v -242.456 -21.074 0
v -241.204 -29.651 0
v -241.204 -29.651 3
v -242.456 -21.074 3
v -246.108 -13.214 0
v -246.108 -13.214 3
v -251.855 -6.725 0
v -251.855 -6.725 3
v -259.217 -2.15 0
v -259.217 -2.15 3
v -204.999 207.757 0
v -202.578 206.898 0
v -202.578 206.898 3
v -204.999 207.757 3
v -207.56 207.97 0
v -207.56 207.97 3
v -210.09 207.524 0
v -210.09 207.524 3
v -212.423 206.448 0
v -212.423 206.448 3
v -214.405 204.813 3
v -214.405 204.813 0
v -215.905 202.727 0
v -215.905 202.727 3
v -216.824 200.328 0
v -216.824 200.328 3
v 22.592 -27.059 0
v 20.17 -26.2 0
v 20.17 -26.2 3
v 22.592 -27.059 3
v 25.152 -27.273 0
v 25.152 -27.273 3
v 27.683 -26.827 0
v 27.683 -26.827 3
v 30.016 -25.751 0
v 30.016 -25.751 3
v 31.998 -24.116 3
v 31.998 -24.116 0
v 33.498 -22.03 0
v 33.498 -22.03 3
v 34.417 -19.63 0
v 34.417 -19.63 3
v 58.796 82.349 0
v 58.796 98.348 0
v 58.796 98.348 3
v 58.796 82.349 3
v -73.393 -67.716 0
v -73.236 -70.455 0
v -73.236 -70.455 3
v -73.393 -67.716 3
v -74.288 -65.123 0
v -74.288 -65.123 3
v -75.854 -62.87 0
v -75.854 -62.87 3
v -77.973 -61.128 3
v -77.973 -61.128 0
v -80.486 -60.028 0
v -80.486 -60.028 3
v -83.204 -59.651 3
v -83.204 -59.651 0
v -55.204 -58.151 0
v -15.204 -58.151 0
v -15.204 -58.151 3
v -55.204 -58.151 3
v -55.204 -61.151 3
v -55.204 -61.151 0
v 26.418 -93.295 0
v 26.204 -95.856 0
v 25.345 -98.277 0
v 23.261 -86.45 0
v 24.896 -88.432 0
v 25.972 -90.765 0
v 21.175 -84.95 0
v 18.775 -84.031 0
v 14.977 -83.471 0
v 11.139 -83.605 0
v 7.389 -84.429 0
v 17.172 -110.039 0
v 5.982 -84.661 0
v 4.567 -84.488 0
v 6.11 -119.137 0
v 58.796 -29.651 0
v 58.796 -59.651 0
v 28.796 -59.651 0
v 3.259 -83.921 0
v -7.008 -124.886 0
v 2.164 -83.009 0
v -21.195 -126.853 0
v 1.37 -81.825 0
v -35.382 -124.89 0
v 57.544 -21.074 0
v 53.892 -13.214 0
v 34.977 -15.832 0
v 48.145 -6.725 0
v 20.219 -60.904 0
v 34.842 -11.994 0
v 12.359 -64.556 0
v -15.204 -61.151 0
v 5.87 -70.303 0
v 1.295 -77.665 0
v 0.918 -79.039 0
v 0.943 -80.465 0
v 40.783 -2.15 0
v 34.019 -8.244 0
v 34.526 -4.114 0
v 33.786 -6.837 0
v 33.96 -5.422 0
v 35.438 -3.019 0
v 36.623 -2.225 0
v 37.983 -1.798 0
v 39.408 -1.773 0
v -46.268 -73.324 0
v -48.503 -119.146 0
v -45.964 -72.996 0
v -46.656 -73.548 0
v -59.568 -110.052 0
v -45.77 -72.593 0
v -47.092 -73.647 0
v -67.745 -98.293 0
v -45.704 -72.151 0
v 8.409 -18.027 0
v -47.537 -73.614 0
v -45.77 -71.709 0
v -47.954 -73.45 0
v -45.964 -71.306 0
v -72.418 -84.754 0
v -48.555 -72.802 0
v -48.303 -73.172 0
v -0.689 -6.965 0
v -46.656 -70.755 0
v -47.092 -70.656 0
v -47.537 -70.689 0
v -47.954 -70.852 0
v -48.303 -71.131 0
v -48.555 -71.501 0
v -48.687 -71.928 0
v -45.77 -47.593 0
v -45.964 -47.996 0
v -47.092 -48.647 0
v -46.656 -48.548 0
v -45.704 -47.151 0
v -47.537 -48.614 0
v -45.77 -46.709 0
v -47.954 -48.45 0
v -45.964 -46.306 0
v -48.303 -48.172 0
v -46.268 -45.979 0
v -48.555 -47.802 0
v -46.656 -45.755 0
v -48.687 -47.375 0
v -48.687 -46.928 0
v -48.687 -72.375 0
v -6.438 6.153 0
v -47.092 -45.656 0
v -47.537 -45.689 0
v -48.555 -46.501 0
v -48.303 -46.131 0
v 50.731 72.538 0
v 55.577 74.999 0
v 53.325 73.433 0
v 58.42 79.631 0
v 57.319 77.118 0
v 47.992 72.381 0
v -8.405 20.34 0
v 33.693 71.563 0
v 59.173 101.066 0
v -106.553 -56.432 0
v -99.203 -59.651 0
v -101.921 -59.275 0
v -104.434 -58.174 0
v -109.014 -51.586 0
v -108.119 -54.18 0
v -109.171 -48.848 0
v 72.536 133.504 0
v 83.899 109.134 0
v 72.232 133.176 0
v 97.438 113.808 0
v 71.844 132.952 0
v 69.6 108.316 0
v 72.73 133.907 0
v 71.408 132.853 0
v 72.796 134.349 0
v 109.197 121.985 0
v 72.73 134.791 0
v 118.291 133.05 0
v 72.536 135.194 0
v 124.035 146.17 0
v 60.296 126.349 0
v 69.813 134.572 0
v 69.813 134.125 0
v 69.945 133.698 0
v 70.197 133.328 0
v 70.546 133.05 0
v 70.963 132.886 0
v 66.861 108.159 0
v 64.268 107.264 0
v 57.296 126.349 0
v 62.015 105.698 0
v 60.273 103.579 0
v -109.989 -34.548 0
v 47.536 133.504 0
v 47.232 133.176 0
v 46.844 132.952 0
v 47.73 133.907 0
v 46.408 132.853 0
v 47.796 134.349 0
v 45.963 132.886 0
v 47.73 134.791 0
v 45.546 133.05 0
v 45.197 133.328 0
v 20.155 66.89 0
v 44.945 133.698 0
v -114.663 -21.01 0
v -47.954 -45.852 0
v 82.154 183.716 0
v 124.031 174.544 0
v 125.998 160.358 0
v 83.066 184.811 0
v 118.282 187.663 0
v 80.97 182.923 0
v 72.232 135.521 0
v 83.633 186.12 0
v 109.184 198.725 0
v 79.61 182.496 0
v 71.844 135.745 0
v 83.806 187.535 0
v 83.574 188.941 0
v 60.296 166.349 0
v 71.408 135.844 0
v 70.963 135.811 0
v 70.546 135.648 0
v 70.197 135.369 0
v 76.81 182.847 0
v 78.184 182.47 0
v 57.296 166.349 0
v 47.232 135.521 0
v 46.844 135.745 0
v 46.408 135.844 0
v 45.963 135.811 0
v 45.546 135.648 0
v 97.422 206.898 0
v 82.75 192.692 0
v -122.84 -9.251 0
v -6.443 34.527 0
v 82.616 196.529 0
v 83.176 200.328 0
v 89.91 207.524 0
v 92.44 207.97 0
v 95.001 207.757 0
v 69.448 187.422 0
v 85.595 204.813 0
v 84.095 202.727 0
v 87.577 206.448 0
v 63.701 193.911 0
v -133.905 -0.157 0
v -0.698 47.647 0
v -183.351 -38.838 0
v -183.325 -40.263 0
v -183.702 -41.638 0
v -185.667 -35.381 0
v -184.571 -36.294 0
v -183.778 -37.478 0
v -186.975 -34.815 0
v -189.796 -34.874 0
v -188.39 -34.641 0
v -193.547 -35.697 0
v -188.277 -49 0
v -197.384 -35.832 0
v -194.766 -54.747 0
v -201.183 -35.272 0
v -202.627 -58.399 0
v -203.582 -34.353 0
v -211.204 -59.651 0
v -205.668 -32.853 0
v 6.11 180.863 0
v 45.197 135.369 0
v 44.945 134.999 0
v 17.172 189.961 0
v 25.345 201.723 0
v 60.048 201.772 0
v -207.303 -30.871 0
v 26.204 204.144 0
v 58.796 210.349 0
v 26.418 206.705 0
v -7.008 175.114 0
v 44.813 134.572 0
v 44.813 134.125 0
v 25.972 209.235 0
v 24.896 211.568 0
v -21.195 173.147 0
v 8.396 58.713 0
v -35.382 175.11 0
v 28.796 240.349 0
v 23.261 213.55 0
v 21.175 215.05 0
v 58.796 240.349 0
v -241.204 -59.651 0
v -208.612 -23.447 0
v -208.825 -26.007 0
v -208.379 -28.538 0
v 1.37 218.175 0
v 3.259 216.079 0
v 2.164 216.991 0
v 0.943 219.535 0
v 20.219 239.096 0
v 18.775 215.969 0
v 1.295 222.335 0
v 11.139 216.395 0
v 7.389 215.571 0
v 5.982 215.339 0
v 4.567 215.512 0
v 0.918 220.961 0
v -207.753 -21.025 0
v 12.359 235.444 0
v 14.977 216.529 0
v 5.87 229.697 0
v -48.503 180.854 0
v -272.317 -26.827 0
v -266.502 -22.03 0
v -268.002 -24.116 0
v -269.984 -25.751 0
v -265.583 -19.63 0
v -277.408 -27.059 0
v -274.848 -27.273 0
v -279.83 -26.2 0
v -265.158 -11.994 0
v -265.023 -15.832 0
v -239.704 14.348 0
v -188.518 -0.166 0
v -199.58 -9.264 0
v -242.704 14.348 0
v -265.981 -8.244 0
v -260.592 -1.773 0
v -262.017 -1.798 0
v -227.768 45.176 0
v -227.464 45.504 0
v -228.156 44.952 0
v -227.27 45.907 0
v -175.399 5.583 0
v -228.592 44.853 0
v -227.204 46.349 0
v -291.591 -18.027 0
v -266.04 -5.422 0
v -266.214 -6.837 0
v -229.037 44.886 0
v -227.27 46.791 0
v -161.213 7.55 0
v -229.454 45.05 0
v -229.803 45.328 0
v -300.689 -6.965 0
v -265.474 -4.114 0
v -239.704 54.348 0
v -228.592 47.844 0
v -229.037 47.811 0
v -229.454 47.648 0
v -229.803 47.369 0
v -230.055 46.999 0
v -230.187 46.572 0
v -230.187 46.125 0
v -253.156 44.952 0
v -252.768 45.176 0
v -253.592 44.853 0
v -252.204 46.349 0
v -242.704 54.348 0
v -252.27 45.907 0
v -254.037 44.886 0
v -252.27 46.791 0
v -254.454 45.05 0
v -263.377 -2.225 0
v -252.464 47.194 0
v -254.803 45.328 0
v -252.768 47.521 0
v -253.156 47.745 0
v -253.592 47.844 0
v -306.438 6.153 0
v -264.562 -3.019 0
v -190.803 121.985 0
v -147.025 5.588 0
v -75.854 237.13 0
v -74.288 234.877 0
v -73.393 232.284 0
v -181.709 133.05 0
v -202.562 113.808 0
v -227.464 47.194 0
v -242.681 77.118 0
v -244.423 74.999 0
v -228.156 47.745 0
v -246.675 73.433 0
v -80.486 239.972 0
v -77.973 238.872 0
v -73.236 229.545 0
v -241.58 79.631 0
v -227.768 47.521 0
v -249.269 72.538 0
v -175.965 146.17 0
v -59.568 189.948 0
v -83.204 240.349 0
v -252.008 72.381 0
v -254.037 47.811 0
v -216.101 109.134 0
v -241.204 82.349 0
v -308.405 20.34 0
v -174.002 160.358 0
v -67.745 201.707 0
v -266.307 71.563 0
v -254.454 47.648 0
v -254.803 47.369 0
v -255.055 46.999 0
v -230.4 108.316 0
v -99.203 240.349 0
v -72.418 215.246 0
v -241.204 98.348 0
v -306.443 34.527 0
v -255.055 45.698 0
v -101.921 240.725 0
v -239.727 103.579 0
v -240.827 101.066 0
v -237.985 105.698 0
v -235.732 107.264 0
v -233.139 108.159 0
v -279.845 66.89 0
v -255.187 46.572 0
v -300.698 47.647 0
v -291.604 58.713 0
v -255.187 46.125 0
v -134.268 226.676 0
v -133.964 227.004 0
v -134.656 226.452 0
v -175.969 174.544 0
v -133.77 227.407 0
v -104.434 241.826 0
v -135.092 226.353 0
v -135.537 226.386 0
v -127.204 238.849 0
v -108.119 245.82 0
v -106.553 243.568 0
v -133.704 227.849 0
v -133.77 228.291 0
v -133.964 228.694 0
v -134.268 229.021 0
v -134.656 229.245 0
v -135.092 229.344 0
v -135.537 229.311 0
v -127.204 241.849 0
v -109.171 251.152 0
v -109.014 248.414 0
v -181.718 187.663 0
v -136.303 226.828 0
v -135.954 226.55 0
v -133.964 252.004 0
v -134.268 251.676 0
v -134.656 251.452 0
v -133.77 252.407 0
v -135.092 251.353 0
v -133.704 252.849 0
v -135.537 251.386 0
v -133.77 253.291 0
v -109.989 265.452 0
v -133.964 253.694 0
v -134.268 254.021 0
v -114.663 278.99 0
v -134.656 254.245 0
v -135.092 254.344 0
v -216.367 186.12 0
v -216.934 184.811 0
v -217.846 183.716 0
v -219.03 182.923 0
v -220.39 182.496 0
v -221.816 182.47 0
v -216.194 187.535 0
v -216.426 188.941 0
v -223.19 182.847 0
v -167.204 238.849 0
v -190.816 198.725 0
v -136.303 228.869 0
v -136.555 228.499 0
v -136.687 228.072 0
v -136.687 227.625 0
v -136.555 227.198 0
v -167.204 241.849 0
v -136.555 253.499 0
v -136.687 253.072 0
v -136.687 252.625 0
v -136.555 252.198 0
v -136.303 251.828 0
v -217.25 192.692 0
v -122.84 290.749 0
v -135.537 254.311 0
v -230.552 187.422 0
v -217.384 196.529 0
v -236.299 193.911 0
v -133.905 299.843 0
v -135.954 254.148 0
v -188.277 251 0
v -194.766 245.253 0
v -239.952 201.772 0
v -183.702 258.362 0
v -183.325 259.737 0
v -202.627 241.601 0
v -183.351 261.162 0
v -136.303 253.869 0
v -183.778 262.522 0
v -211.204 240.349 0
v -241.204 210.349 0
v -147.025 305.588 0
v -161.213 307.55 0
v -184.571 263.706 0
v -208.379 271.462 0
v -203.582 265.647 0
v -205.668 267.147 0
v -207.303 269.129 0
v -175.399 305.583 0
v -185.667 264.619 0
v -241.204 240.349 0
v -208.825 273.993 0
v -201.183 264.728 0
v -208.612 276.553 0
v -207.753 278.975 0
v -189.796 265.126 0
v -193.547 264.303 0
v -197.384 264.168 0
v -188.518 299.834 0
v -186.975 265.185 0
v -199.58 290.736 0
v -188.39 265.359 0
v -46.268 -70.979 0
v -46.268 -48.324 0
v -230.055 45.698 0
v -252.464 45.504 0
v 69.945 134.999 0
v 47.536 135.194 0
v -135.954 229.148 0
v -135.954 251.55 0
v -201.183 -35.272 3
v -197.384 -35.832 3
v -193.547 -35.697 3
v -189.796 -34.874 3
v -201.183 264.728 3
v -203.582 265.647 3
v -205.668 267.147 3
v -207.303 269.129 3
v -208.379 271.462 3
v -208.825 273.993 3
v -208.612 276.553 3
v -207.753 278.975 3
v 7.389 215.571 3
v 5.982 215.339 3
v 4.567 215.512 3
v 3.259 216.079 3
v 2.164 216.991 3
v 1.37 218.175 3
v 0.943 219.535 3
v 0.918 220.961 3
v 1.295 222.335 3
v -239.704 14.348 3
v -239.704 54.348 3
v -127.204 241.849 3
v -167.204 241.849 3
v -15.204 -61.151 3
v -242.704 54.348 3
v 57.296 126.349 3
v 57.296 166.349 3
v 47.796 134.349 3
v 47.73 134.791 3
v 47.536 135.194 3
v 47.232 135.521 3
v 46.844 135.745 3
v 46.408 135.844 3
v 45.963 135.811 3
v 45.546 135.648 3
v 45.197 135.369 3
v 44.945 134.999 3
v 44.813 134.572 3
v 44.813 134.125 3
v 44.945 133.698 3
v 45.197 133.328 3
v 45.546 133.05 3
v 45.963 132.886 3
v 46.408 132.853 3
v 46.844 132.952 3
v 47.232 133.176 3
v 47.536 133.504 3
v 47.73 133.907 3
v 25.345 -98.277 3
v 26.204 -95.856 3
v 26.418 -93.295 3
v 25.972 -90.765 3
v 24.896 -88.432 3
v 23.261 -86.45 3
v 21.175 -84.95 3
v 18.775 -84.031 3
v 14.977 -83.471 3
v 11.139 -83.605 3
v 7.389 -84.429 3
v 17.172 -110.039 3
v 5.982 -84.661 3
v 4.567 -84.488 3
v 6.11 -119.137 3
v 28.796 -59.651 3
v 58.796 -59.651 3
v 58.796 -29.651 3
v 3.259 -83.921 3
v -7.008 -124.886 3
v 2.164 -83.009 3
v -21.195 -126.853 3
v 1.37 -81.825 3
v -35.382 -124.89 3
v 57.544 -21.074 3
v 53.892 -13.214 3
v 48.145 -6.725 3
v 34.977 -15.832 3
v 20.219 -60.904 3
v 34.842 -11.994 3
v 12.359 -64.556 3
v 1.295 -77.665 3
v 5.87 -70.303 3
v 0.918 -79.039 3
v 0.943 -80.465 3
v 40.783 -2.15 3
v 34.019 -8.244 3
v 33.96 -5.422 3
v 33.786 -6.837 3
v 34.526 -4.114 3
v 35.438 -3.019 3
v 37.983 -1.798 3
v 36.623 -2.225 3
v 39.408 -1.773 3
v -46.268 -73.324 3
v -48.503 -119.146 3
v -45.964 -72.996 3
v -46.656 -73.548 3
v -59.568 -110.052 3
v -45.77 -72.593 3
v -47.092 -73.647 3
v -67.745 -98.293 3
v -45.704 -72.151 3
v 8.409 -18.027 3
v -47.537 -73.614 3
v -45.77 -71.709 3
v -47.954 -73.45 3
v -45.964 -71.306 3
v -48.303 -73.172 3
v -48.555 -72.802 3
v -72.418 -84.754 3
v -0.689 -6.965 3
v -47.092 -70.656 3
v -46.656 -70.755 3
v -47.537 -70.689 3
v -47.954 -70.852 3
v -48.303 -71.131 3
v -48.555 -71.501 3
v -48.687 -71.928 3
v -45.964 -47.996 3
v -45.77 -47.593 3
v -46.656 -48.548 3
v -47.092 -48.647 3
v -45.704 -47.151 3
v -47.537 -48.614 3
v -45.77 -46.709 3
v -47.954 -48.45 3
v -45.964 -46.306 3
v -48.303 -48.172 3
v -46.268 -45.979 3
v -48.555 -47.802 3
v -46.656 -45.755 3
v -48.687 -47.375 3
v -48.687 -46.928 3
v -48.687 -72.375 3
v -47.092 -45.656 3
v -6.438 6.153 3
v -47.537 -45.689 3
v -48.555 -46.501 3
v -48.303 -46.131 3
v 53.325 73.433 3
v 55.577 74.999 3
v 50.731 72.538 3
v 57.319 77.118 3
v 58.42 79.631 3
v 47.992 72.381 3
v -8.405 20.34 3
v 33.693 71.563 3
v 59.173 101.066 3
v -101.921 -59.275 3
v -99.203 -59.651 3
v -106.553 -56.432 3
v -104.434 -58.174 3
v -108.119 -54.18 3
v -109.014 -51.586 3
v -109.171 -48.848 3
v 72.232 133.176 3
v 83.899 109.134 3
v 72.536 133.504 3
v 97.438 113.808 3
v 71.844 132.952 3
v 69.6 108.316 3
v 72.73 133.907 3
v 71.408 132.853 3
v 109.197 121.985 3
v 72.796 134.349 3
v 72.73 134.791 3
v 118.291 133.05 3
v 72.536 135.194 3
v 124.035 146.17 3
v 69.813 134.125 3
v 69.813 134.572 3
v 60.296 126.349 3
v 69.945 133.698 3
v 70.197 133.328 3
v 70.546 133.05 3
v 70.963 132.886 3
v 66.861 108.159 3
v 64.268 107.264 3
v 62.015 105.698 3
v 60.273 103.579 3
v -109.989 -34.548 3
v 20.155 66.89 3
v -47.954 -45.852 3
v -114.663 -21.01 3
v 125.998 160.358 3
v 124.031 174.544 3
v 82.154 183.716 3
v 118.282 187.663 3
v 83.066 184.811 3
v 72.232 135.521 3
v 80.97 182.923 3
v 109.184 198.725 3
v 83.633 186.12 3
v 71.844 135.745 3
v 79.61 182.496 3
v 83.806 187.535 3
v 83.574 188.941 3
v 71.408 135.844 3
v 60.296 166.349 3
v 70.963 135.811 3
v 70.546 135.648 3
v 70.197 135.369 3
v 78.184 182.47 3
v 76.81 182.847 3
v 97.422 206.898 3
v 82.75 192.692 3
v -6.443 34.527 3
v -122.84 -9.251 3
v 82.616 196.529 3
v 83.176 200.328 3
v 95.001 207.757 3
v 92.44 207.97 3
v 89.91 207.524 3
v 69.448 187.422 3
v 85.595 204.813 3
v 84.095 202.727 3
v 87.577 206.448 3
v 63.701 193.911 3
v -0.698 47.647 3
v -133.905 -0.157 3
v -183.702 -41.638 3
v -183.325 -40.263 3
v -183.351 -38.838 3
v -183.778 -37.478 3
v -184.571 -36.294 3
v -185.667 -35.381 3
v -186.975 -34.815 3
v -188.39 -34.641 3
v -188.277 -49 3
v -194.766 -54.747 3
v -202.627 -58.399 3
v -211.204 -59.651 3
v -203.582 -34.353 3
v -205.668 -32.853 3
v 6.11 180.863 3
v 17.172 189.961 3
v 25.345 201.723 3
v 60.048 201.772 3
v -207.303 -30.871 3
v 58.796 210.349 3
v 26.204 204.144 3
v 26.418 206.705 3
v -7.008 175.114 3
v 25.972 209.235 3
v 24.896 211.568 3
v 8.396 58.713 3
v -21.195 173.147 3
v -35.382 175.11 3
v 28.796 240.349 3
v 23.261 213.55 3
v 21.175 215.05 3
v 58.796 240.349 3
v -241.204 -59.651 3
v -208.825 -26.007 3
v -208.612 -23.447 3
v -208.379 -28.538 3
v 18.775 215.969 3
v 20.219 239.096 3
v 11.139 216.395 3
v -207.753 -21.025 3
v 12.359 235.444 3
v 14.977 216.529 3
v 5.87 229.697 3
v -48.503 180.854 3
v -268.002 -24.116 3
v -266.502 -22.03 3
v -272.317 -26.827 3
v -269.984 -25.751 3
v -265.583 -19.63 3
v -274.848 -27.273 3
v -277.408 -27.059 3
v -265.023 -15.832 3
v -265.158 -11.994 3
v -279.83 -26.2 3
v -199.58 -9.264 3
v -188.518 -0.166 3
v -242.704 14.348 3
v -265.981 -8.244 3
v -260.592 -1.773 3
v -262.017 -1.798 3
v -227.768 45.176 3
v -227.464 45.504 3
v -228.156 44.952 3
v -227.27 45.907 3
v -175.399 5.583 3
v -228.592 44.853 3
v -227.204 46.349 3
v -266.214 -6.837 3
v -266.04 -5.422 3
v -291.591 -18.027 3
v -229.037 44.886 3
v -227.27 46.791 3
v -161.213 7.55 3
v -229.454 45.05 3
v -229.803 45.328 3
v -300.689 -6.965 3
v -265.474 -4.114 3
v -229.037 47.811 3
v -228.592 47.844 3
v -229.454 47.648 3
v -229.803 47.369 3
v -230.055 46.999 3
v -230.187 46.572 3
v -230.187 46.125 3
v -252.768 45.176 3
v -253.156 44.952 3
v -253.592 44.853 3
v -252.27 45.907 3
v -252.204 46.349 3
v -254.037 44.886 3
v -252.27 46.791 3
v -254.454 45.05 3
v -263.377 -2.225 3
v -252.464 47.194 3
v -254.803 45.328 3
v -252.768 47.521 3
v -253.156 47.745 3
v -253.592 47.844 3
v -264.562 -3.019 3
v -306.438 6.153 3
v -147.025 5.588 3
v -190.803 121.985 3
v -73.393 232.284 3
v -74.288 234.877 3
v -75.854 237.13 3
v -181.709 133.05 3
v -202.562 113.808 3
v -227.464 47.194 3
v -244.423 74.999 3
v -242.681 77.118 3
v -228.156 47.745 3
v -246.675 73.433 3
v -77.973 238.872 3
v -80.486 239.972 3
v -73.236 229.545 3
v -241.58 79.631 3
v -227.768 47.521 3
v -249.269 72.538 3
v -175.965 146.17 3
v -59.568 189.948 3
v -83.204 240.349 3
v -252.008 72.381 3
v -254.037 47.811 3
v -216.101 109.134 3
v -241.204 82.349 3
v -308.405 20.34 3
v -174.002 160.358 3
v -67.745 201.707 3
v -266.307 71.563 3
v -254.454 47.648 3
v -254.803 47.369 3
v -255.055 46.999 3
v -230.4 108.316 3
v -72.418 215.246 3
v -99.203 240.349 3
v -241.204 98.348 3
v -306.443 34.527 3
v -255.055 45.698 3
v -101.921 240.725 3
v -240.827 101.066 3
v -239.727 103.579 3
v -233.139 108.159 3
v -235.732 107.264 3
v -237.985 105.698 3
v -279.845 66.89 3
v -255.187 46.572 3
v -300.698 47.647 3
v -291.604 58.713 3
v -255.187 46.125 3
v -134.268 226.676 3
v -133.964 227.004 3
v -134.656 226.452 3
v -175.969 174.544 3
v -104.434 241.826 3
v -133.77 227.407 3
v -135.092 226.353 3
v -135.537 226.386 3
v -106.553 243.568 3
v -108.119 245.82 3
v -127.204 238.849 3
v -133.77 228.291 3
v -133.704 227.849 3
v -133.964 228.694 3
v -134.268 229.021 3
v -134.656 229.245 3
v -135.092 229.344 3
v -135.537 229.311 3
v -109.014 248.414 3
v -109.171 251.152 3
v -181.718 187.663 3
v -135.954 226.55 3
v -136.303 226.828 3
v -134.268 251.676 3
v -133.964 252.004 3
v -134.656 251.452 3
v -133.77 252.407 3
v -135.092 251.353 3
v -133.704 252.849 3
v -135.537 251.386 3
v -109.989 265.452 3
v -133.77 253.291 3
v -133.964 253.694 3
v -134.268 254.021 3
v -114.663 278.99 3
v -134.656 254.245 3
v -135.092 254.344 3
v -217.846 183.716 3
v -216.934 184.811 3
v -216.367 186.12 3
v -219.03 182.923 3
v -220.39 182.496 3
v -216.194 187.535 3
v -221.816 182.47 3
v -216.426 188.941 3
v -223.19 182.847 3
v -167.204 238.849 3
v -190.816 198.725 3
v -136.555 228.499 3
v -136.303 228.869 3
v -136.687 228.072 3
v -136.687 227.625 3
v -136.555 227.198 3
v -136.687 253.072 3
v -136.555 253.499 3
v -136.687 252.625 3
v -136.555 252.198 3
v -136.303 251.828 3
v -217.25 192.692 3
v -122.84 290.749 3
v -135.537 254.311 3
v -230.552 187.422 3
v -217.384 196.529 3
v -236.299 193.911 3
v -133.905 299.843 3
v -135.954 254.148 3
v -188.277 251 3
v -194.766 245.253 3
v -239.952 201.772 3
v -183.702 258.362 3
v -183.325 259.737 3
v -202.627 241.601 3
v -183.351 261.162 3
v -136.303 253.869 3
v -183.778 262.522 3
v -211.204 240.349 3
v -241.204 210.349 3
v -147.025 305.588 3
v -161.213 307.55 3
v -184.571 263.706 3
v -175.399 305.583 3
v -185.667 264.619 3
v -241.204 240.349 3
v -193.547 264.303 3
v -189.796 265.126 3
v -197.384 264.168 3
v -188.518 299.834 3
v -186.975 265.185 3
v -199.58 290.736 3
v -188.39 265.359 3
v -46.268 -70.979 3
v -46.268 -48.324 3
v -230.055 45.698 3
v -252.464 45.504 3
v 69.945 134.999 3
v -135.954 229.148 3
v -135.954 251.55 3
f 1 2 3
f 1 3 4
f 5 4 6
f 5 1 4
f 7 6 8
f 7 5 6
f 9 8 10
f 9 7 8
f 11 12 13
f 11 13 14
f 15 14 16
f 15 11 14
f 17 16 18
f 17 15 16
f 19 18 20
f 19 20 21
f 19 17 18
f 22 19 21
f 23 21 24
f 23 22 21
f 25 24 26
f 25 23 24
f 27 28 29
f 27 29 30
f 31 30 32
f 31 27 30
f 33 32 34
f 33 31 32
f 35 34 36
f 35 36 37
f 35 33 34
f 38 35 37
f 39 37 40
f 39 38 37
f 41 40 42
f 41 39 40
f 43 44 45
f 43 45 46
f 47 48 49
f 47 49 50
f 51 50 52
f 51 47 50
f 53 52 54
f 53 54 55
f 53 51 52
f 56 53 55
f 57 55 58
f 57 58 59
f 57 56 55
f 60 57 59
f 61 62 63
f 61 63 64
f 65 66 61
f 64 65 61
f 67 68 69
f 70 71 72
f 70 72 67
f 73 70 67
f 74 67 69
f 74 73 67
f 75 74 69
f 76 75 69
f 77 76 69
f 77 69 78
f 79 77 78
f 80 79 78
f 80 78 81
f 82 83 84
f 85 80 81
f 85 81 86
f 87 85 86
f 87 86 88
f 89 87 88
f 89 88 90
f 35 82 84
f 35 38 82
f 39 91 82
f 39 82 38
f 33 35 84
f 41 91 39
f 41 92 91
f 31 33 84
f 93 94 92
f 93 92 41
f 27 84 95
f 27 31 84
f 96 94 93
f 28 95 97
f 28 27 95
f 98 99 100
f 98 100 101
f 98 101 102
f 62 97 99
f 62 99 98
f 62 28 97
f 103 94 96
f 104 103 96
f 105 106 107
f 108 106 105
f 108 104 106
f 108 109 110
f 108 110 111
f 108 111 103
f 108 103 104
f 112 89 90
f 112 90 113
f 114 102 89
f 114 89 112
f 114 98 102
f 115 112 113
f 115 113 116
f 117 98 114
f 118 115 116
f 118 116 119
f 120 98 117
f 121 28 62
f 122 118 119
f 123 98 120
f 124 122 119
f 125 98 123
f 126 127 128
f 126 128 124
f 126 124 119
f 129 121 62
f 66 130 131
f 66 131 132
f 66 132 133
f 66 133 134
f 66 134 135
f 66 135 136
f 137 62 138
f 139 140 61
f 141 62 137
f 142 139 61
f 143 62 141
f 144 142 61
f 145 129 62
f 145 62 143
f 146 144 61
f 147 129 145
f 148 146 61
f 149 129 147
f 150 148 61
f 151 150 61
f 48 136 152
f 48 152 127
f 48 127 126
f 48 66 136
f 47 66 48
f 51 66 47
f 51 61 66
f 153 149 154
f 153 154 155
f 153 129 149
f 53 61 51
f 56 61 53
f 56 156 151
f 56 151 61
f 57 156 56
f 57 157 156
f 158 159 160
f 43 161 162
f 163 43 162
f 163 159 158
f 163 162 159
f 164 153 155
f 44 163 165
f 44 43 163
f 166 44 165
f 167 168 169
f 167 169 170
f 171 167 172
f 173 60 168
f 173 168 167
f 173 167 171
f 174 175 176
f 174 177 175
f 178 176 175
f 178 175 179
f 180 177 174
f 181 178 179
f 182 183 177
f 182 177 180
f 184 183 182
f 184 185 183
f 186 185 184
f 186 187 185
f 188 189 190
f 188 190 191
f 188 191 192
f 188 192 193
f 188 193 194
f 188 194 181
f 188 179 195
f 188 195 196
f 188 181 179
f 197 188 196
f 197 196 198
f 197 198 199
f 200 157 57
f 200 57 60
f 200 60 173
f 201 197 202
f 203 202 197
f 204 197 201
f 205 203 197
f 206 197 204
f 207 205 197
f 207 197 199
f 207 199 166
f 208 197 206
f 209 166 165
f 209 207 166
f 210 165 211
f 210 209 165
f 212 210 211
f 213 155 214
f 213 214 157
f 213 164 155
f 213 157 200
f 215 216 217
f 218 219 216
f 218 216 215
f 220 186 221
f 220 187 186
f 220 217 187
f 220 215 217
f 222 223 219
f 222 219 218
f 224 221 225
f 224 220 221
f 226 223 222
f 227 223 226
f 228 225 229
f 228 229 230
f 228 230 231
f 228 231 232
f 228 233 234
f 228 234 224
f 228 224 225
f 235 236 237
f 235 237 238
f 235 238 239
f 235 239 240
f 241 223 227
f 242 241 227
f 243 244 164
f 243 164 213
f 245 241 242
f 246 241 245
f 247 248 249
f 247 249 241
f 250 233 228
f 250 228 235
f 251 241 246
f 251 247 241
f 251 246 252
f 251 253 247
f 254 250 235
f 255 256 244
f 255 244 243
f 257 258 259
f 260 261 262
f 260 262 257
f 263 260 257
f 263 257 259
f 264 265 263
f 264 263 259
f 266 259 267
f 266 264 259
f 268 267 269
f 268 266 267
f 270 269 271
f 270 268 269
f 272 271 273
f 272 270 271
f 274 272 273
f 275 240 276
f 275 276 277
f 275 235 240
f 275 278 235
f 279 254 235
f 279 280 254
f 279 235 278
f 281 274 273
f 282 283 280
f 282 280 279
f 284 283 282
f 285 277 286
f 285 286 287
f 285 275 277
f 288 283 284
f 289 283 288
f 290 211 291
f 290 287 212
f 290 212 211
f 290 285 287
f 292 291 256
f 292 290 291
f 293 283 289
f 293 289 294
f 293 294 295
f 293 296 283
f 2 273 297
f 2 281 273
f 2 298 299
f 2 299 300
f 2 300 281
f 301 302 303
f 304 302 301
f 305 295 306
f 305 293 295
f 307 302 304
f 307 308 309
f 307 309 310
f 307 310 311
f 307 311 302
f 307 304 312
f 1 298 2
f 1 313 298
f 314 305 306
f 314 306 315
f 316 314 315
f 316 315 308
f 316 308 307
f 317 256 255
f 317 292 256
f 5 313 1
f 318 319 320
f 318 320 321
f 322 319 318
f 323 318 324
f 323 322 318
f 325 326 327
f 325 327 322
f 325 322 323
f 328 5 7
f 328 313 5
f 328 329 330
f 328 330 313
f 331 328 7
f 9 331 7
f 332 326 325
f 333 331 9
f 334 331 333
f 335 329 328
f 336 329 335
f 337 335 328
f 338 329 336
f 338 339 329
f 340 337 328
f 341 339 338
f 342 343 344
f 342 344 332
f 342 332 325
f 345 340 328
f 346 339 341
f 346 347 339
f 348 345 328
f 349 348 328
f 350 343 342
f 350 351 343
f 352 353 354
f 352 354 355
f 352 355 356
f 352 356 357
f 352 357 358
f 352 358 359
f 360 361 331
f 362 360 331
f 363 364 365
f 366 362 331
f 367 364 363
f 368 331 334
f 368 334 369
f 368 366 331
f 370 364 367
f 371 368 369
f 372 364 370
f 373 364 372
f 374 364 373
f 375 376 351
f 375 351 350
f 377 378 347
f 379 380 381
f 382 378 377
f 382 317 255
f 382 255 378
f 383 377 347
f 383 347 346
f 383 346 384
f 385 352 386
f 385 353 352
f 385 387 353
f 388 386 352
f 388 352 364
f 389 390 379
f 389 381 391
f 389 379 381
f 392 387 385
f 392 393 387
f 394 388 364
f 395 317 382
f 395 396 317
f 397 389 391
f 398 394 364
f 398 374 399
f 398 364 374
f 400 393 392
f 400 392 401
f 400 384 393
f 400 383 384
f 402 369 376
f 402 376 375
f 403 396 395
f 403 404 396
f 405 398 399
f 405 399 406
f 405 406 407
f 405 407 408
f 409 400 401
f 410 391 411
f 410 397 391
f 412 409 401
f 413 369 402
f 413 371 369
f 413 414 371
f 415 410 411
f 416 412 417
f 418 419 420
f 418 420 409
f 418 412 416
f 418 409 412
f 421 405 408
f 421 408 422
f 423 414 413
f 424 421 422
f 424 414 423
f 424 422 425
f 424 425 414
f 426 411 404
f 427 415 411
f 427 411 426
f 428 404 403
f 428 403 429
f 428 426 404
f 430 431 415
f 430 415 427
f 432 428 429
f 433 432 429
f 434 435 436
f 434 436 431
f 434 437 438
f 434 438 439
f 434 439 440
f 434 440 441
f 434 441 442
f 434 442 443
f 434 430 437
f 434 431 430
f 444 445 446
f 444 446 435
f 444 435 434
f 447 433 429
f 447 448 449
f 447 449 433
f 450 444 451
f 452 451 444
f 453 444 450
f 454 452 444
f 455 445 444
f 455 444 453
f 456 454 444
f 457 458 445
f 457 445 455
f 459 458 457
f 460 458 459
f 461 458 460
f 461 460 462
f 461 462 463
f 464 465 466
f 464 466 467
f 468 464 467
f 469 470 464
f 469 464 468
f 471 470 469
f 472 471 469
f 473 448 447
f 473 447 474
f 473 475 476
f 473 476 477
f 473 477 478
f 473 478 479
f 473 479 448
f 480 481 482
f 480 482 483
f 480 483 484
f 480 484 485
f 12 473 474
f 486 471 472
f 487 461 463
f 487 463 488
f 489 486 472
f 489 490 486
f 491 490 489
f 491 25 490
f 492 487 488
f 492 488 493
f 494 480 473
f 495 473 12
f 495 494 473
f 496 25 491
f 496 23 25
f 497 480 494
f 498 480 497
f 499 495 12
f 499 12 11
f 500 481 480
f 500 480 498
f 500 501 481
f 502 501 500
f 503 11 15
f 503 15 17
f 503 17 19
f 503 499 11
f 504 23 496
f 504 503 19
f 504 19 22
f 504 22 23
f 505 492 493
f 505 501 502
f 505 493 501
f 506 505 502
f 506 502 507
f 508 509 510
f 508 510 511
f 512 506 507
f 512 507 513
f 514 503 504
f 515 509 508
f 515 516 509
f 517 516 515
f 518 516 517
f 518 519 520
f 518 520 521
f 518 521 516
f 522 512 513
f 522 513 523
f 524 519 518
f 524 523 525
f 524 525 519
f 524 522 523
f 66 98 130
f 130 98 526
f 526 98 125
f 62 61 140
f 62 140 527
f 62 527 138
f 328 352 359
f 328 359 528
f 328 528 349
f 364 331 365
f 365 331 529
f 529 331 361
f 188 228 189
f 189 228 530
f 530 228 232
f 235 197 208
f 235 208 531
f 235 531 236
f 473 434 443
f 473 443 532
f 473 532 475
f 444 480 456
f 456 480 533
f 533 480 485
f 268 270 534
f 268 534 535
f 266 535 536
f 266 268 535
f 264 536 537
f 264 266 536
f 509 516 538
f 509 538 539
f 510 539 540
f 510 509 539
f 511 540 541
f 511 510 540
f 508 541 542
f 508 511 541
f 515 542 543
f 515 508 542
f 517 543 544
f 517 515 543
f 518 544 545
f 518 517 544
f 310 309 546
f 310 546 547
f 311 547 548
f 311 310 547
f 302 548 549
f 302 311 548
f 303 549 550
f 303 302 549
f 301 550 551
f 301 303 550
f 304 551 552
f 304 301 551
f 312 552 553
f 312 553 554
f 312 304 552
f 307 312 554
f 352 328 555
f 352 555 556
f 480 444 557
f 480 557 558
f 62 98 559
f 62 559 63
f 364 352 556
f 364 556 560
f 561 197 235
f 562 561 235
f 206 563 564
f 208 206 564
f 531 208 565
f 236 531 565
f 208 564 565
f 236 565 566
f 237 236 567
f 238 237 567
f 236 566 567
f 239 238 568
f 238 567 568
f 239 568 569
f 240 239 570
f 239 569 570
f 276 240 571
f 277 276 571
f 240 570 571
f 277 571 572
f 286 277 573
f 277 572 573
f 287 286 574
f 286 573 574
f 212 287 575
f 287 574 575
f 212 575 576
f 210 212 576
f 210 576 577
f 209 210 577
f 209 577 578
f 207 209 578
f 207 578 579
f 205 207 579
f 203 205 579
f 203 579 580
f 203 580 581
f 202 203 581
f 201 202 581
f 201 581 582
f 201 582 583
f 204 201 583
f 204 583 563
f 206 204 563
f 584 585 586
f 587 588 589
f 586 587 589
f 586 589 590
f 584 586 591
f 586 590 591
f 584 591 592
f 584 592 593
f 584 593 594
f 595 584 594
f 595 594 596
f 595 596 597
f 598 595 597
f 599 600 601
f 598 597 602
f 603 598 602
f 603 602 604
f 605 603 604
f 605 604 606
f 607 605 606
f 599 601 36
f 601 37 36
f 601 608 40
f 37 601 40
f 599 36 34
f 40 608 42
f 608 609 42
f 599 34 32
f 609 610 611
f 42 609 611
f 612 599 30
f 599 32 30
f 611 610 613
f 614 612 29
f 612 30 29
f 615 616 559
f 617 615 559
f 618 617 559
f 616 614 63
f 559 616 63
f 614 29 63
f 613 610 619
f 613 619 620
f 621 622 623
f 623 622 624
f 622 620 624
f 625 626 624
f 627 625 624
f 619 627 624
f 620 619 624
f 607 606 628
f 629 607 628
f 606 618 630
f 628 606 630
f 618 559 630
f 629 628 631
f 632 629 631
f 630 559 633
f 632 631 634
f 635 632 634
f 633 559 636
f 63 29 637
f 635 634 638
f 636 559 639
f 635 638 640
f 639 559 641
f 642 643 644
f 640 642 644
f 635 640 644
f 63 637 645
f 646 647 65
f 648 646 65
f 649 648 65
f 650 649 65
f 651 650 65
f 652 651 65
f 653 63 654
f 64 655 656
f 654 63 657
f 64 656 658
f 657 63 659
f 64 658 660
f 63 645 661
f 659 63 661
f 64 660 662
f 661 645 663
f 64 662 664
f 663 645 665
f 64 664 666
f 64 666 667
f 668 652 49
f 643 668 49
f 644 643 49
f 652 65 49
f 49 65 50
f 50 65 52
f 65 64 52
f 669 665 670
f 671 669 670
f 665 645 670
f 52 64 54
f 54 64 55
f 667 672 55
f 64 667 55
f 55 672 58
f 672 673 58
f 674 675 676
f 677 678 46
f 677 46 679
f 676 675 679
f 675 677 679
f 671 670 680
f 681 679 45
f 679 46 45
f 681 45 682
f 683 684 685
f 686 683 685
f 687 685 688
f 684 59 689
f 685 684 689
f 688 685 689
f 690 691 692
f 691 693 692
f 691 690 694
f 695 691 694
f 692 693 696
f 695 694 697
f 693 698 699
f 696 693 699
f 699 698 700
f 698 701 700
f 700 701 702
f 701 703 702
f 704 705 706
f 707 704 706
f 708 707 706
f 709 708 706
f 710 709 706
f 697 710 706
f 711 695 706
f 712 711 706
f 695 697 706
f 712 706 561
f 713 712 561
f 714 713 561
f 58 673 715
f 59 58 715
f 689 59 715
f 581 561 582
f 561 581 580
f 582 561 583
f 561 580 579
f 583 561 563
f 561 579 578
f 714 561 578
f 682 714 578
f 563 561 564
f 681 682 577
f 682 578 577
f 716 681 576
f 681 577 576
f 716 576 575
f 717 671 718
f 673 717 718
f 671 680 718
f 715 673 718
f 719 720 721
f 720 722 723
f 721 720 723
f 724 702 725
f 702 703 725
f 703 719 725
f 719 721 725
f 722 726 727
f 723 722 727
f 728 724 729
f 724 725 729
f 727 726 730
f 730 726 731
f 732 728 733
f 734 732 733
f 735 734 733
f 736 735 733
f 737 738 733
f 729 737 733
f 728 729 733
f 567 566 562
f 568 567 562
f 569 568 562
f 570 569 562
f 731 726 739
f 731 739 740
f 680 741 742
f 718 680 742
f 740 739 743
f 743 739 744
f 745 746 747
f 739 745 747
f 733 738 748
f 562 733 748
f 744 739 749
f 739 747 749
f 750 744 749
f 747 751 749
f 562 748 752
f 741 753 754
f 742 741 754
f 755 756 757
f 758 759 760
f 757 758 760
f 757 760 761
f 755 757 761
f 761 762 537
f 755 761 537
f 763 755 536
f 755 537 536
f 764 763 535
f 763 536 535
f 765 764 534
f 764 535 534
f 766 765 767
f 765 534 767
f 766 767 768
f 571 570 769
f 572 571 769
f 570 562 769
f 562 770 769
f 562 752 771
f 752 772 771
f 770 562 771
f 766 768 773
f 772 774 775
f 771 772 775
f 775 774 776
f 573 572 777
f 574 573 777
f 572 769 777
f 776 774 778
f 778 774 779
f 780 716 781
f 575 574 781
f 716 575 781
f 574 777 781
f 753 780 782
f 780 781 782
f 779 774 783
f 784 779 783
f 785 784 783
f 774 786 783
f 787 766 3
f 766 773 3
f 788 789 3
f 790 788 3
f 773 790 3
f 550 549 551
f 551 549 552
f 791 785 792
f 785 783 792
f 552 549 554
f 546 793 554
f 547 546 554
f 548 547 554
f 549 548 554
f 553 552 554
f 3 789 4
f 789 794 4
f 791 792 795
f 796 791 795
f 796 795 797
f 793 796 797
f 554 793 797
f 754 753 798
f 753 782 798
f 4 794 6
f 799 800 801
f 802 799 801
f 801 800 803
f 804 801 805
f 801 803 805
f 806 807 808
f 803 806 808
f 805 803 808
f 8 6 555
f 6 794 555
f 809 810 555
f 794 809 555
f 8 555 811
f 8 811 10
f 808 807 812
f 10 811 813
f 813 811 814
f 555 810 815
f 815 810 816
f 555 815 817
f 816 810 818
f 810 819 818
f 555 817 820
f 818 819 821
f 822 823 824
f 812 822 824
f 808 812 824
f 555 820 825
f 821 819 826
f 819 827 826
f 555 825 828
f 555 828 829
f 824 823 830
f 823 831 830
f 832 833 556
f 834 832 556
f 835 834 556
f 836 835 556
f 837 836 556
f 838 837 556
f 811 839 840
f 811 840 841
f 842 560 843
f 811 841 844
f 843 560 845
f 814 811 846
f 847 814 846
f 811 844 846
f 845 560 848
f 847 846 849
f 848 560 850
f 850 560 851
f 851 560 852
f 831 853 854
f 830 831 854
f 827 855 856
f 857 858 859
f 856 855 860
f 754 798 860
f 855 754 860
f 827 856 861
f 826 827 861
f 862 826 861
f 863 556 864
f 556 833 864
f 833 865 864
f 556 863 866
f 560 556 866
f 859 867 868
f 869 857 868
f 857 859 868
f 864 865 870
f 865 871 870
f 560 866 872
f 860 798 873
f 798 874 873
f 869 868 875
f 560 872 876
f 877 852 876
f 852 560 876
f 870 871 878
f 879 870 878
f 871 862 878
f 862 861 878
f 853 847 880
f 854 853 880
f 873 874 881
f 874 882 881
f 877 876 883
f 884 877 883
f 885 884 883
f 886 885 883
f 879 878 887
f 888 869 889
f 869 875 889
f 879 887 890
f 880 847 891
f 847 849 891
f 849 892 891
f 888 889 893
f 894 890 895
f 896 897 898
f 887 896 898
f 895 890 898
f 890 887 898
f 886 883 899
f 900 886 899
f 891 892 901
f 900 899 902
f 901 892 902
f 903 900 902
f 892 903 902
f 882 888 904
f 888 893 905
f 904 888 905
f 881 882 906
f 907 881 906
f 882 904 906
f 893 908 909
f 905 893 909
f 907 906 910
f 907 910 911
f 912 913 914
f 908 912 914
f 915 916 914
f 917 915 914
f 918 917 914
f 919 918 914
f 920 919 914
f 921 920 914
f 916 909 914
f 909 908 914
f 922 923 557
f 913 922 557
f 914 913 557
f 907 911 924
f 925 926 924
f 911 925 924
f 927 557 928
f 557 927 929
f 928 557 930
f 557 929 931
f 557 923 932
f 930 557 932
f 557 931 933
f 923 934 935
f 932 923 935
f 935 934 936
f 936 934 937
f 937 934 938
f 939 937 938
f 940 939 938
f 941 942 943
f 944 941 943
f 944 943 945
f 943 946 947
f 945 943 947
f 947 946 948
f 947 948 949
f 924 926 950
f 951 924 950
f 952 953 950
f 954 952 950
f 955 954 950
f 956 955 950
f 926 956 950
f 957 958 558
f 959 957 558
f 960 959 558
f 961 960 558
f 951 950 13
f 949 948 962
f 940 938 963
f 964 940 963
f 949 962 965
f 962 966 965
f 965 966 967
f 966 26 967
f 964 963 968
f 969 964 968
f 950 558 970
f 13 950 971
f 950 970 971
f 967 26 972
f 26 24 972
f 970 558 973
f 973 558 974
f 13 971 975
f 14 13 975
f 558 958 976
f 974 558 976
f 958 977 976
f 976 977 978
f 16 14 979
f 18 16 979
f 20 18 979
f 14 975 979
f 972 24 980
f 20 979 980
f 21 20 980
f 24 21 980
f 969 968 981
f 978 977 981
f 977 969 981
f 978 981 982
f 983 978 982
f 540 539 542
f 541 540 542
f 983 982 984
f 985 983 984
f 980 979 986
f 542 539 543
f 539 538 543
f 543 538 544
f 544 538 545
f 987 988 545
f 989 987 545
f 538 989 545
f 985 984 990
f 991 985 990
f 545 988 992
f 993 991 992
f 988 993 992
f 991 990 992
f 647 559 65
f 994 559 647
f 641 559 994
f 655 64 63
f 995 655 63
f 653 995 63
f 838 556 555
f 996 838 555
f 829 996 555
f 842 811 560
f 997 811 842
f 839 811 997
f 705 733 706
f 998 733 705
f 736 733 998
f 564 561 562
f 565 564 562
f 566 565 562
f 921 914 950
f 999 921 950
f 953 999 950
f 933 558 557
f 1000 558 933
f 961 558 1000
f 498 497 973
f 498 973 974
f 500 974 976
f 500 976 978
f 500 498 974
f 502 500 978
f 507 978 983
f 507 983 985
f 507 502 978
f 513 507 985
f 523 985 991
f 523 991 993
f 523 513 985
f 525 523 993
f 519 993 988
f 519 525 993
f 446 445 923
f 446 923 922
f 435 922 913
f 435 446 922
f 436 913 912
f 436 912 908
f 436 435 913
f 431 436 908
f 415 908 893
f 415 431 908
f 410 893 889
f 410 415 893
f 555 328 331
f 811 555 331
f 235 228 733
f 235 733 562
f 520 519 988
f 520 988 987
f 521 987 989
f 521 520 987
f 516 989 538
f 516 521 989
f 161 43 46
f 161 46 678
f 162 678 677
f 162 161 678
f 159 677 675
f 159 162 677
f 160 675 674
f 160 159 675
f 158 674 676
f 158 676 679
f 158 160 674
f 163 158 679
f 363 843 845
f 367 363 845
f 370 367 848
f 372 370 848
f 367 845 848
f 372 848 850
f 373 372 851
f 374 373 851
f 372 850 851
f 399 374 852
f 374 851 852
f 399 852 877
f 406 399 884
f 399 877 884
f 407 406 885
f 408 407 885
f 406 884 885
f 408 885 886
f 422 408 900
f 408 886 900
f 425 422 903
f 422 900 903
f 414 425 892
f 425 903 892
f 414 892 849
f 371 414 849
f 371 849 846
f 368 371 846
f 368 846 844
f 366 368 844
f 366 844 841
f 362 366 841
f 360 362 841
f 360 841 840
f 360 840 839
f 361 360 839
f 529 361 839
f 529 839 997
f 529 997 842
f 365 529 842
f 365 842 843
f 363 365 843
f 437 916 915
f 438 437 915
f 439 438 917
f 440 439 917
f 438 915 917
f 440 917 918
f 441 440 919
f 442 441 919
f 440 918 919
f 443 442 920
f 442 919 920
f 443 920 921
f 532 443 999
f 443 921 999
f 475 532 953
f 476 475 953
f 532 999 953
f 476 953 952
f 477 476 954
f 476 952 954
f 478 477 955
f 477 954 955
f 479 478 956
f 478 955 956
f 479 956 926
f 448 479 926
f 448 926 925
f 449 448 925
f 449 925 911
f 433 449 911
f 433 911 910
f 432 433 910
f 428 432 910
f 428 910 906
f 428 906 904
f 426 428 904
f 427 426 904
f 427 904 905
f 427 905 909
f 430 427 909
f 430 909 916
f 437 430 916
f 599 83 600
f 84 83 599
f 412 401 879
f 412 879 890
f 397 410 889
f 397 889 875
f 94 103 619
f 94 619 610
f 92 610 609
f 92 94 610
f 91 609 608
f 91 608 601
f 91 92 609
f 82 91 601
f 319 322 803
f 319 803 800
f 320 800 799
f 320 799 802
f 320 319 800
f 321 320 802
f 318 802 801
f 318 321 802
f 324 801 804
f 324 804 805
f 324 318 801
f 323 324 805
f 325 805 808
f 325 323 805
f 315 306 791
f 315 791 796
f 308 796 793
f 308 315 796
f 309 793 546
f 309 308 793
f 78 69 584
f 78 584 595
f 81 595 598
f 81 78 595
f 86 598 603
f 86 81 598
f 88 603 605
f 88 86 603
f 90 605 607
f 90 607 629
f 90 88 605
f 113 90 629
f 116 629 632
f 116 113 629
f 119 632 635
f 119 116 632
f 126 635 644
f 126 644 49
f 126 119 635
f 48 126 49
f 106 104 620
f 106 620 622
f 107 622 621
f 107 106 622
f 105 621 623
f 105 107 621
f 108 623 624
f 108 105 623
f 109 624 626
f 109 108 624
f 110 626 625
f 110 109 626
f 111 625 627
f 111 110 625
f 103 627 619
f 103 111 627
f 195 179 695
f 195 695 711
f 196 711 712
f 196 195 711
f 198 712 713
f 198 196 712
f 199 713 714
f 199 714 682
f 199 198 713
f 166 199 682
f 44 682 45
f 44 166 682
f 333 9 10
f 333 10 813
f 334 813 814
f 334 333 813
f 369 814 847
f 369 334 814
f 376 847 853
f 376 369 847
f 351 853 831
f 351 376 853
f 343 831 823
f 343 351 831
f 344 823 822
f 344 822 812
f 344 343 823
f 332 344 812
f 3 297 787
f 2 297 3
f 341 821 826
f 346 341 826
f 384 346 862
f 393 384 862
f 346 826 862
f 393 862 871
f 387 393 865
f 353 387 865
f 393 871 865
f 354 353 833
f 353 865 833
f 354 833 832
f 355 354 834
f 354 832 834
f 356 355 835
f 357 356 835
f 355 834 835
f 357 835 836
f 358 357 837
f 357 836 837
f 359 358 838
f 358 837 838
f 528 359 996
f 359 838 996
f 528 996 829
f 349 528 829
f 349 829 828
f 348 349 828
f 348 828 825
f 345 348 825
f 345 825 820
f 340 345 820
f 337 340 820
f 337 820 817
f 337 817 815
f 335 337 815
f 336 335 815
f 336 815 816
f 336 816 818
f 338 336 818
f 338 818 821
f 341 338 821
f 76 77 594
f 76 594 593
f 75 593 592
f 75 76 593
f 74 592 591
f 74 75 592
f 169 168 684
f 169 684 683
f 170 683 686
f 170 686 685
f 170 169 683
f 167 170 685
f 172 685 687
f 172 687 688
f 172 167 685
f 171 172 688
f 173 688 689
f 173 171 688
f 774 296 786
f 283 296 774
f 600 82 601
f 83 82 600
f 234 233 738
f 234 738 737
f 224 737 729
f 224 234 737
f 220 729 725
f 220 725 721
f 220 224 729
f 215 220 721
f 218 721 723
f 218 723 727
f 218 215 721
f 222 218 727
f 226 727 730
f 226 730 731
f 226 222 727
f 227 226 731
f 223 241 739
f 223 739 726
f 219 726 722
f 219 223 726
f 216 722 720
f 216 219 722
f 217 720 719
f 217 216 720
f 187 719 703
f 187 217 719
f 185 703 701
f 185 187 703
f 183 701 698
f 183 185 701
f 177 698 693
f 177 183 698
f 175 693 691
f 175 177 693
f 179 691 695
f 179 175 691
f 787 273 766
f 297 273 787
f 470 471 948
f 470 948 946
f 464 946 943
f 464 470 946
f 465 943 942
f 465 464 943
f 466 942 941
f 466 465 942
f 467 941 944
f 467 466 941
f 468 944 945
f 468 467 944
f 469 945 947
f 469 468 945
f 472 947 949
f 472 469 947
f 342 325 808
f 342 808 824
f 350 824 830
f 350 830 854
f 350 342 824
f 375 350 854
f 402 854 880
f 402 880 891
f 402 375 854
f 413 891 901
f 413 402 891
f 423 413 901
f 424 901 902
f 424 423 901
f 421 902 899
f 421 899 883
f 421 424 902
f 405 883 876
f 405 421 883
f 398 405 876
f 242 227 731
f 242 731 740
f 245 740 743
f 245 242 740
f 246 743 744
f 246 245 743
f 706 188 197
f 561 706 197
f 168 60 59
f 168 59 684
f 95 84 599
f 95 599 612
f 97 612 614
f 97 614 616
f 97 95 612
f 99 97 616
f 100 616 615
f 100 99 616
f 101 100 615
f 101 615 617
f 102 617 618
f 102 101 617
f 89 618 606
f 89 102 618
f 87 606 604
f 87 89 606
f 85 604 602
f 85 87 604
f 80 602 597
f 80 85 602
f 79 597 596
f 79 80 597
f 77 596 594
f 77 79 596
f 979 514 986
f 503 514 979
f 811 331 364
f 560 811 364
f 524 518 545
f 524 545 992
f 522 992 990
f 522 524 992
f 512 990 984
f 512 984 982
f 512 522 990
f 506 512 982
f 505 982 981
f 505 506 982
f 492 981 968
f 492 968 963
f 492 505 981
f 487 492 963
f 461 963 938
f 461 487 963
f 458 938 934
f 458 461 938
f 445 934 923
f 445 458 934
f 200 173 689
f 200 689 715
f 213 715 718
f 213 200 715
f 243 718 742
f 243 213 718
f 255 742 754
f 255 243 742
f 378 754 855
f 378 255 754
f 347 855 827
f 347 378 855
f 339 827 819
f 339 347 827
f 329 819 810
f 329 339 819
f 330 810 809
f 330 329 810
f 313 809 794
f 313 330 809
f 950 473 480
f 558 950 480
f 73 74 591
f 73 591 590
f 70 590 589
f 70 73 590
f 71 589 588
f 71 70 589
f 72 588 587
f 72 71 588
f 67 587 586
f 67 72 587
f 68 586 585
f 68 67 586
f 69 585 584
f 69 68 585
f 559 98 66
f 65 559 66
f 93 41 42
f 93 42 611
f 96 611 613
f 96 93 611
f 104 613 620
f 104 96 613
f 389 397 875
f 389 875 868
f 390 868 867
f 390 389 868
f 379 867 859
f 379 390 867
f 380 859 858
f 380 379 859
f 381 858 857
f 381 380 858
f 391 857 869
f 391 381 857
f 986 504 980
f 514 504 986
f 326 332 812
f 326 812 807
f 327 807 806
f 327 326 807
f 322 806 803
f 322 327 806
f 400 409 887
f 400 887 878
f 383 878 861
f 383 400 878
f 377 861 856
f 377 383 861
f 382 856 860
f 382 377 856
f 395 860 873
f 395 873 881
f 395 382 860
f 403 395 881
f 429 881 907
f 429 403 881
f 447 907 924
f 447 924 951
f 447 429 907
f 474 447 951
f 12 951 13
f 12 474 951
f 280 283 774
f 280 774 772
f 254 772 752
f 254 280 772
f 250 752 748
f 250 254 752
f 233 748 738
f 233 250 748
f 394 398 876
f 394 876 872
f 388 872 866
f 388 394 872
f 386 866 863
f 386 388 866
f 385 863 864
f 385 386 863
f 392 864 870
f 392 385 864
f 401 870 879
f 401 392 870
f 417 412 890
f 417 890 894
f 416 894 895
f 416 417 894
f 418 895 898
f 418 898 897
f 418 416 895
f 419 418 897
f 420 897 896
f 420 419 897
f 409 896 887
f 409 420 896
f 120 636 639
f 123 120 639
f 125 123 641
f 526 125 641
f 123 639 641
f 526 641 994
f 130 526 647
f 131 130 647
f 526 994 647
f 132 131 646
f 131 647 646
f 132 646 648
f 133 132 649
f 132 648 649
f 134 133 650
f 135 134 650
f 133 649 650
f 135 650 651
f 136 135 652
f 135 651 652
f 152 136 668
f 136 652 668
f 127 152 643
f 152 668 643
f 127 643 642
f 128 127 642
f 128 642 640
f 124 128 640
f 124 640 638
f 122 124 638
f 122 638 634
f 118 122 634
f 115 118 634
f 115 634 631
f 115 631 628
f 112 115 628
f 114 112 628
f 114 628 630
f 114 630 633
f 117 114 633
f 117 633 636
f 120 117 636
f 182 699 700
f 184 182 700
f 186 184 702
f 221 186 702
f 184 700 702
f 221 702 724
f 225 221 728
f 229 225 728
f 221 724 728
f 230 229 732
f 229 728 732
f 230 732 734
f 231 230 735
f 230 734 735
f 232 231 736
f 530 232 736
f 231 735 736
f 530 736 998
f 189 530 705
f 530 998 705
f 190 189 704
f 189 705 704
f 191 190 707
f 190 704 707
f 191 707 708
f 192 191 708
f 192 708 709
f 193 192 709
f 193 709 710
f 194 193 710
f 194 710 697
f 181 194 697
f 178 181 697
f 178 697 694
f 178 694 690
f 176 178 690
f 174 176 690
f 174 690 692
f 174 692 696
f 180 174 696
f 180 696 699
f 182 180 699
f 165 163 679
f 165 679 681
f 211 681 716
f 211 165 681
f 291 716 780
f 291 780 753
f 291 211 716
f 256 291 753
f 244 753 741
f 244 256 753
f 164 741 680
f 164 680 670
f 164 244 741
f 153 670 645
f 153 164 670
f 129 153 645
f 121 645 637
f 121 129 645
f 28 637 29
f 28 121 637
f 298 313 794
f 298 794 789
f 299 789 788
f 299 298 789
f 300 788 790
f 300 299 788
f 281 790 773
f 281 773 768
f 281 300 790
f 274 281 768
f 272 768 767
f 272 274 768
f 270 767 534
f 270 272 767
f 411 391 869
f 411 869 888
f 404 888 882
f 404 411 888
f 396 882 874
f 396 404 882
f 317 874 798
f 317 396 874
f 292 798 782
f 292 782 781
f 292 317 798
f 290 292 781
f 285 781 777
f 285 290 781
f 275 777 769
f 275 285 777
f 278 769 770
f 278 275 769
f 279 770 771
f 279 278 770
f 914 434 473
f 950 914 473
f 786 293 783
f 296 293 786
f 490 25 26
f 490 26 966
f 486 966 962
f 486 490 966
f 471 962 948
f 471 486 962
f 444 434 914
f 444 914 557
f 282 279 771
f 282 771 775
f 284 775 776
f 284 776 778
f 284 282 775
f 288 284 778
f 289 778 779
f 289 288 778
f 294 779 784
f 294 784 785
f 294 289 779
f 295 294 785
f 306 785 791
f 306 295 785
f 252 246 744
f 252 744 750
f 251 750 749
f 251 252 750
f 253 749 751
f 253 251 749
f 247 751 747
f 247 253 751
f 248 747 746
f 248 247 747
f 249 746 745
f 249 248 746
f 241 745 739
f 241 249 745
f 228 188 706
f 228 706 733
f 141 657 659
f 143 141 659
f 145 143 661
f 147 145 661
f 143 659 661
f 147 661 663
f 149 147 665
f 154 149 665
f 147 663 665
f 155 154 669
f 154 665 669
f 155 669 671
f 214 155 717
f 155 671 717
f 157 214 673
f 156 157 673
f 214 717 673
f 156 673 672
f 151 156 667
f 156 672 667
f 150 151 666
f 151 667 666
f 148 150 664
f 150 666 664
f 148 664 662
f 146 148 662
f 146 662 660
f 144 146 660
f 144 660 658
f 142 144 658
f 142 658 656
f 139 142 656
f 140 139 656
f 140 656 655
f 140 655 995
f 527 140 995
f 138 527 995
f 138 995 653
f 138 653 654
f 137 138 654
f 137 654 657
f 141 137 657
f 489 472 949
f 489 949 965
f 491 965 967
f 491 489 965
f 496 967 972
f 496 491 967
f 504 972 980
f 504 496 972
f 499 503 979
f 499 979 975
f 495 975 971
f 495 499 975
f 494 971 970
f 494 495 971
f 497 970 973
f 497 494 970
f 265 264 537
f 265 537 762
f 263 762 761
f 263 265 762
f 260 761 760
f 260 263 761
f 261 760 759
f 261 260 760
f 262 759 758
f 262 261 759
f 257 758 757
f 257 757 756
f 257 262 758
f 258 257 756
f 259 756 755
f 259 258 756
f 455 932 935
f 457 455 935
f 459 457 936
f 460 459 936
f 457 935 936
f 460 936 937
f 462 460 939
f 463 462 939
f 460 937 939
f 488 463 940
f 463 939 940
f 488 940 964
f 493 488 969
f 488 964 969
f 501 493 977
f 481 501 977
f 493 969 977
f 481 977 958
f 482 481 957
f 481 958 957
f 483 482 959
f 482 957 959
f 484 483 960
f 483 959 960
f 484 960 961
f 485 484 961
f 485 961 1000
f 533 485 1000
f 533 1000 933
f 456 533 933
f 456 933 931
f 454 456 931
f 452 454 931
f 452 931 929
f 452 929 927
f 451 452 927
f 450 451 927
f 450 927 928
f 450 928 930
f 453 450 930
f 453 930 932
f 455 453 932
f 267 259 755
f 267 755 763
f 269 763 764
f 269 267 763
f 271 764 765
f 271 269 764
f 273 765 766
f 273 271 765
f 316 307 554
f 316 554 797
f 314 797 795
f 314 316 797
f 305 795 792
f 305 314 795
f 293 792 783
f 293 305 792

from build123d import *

# Parameters (mm, degrees)
RESSALTO_EXTRUS_O1_DEPTH = 3
ESBO_O2_W                = 40
ESBO_O2_H                = 3
ESBO_O2_W_2              = 3
ESBO_O2_H_2              = 40
CORTE_EXTRUS_O1_DEPTH    = 436.556992799
ESBO_O3_R                = 1.5
CORTE_EXTRUS_O2_DEPTH    = 436.556992799


with BuildPart() as part:
    # Esboço1 → Ressalto-extrusão1 (new body)
    with BuildSketch(Plane.XY):
        with BuildLine():
            Line((-241.20368795, -59.651351358), (-241.20368795, -29.651351358))
            ThreePointArc((-241.20368795, -29.651351358), (-246.107895674, -13.213553147), (-259.217101951, -2.150046733))
            ThreePointArc((-259.217101951, -2.150046733), (-264.561513741, -3.018769002), (-265.981323334, -8.243858139))
            ThreePointArc((-265.981323334, -8.243858139), (-265.003447457, -13.909864328), (-265.583076332, -19.630344878))
            ThreePointArc((-265.583076332, -19.630344878), (-271.11591561, -26.364097317), (-279.829636843, -26.200406546))
            ThreePointArc((-279.829636843, -26.200406546), (-306.442768457, 34.527322411), (-252.007526665, 72.381256019))
            ThreePointArc((-252.007526665, 72.381256019), (-244.422773084, 74.999120757), (-241.20368795, 82.348895826))
            Line((-241.20368795, 82.348895826), (-241.20368795, 98.348401458))
            ThreePointArc((-241.20368795, 98.348401458), (-237.984602816, 105.698176528), (-230.399849235, 108.316041265))
            ThreePointArc((-230.399849235, 108.316041265), (-175.964607443, 146.169974874), (-202.577739058, 206.897703831))
            ThreePointArc((-202.577739058, 206.897703831), (-211.29146029, 207.061394601), (-216.824299569, 200.327642163))
            ThreePointArc((-216.824299569, 200.327642163), (-217.403928444, 194.607161612), (-216.426052566, 188.941155423))
            ThreePointArc((-216.426052566, 188.941155423), (-217.845862159, 183.716066286), (-223.190273949, 182.847344017))
            ThreePointArc((-223.190273949, 182.847344017), (-236.299480227, 193.910850432), (-241.20368795, 210.348648642))
            Line((-241.20368795, 210.348648642), (-241.20368795, 240.348648642))
            Line((-241.20368795, 240.348648642), (-211.20368795, 240.348648642))
            ThreePointArc((-211.20368795, 240.348648642), (-194.76588974, 245.252856366), (-183.702383325, 258.362062643))
            ThreePointArc((-183.702383325, 258.362062643), (-184.571105594, 263.706474433), (-189.796194731, 265.126284027))
            ThreePointArc((-189.796194731, 265.126284027), (-195.46220092, 264.148408149), (-201.182681471, 264.728037024))
            ThreePointArc((-201.182681471, 264.728037024), (-207.916433909, 270.260876302), (-207.752743138, 278.974597535))
            ThreePointArc((-207.752743138, 278.974597535), (-147.025014182, 305.587729149), (-109.171080573, 251.152487357))
            ThreePointArc((-109.171080573, 251.152487357), (-106.553215836, 243.567733776), (-99.203440766, 240.348648642))
            Line((-99.203440766, 240.348648642), (-83.203935134, 240.348648642))
            ThreePointArc((-83.203935134, 240.348648642), (-75.854160064, 237.129563509), (-73.236295327, 229.544809927))
            ThreePointArc((-73.236295327, 229.544809927), (-35.382361719, 175.109568135), (25.345367238, 201.72269975))
            ThreePointArc((25.345367238, 201.72269975), (25.509058009, 210.436420982), (18.775305571, 215.969260261))
            ThreePointArc((18.775305571, 215.969260261), (13.05482502, 216.548889136), (7.388818831, 215.571013258))
            ThreePointArc((7.388818831, 215.571013258), (2.163729694, 216.990822851), (1.295007425, 222.335234642))
            ThreePointArc((1.295007425, 222.335234642), (12.358513839, 235.444440919), (28.79631205, 240.348648642))
            Line((28.79631205, 240.348648642), (58.79631205, 240.348648642))
            Line((58.79631205, 240.348648642), (58.79631205, 210.348648642))
            ThreePointArc((58.79631205, 210.348648642), (63.700519773, 193.910850432), (76.809726051, 182.847344017))
            ThreePointArc((76.809726051, 182.847344017), (82.154137841, 183.716066286), (83.573947435, 188.941155423))
            ThreePointArc((83.573947435, 188.941155423), (82.596071557, 194.607161612), (83.175700432, 200.327642163))
            ThreePointArc((83.175700432, 200.327642163), (88.70853971, 207.061394601), (97.422260943, 206.89770383))
            ThreePointArc((97.422260943, 206.89770383), (124.035392557, 146.169974874), (69.600150765, 108.316041265))
            ThreePointArc((69.600150765, 108.316041265), (62.015397184, 105.698176528), (58.79631205, 98.348401458))
            Line((58.79631205, 98.348401458), (58.79631205, 82.348895826))
            ThreePointArc((58.79631205, 82.348895826), (55.577226916, 74.999120757), (47.992473335, 72.381256019))
            ThreePointArc((47.992473335, 72.381256019), (-6.442768457, 34.527322411), (20.170363157, -26.200406546))
            ThreePointArc((20.170363157, -26.200406546), (28.88408439, -26.364097317), (34.416923668, -19.630344878))
            ThreePointArc((34.416923668, -19.630344878), (34.996552543, -13.909864328), (34.018676666, -8.243858139))
            ThreePointArc((34.018676666, -8.243858139), (35.438486259, -3.018769002), (40.782898049, -2.150046733))
            ThreePointArc((40.782898049, -2.150046733), (53.892104326, -13.213553147), (58.79631205, -29.651351358))
            Line((58.79631205, -29.651351358), (58.79631205, -59.651351358))
            Line((58.79631205, -59.651351358), (28.79631205, -59.651351358))
            ThreePointArc((28.79631205, -59.651351358), (12.358513839, -64.555559081), (1.295007425, -77.664765358))
            ThreePointArc((1.295007425, -77.664765358), (2.163729694, -83.009177149), (7.388818831, -84.428986742))
            ThreePointArc((7.388818831, -84.428986742), (13.05482502, -83.451110864), (18.775305571, -84.030739739))
            ThreePointArc((18.775305571, -84.030739739), (25.509058009, -89.563579018), (25.345367238, -98.27730025))
            ThreePointArc((25.345367238, -98.27730025), (-35.382361719, -124.890431865), (-73.236295327, -70.455190073))
            ThreePointArc((-73.236295327, -70.455190073), (-75.854160064, -62.870436491), (-83.203935134, -59.651351358))
            Line((-83.203935134, -59.651351358), (-99.203440766, -59.651351358))
            ThreePointArc((-99.203440766, -59.651351358), (-106.553215836, -56.432266224), (-109.171080573, -48.847512643))
            ThreePointArc((-109.171080573, -48.847512643), (-147.025014182, 5.587729149), (-207.752743138, -21.025402465))
            ThreePointArc((-207.752743138, -21.025402465), (-207.916433909, -29.739123698), (-201.182681471, -35.271962976))
            ThreePointArc((-201.182681471, -35.271962976), (-195.46220092, -35.851591851), (-189.796194731, -34.873715973))
            ThreePointArc((-189.796194731, -34.873715973), (-184.571105594, -36.293525567), (-183.702383325, -41.637937357))
            ThreePointArc((-183.702383325, -41.637937357), (-194.76588974, -54.747143634), (-211.20368795, -59.651351358))
            Line((-211.20368795, -59.651351358), (-241.20368795, -59.651351358))
        make_face()
    extrude(amount=RESSALTO_EXTRUS_O1_DEPTH)

    # Esboço2 → Corte-extrusão1 (cut, through all)
    with BuildSketch(Plane(origin=(0, 0, 0), x_dir=(-1, 0, 0), z_dir=(0, 0, -1))):
        with Locations((147.203935134, 240.348648642)):
            Rectangle(ESBO_O2_W, ESBO_O2_H)
        with Locations((-58.79631205, 146.348895826)):
            Rectangle(ESBO_O2_W_2, ESBO_O2_H_2)
        with Locations((35.20368795, -59.651351358)):
            Rectangle(ESBO_O2_W, ESBO_O2_H)
        with Locations((241.20368795, 34.348401458)):
            Rectangle(ESBO_O2_W_2, ESBO_O2_H_2)
    extrude(amount=-CORTE_EXTRUS_O1_DEPTH, mode=Mode.SUBTRACT)

    # Esboço3 → Corte-extrusão2 (cut, through all)
    with BuildSketch(Plane.XY.offset(3)):
        with Locations((-228.70368795, 46.348648642)):
            Circle(ESBO_O3_R)
        with Locations((-47.20368795, -47.151351358)):
            Circle(ESBO_O3_R)
        with Locations((46.29631205, 134.348648642)):
            Circle(ESBO_O3_R)
        with Locations((-135.20368795, 227.848648642)):
            Circle(ESBO_O3_R)
        with Locations((-47.20368795, -72.151351358)):
            Circle(ESBO_O3_R)
        with Locations((-253.70368795, 46.348648642)):
            Circle(ESBO_O3_R)
        with Locations((-135.20368795, 252.848648642)):
            Circle(ESBO_O3_R)
        with Locations((71.29631205, 134.348648642)):
            Circle(ESBO_O3_R)
    extrude(amount=-CORTE_EXTRUS_O2_DEPTH, mode=Mode.SUBTRACT)


solid = part.part
